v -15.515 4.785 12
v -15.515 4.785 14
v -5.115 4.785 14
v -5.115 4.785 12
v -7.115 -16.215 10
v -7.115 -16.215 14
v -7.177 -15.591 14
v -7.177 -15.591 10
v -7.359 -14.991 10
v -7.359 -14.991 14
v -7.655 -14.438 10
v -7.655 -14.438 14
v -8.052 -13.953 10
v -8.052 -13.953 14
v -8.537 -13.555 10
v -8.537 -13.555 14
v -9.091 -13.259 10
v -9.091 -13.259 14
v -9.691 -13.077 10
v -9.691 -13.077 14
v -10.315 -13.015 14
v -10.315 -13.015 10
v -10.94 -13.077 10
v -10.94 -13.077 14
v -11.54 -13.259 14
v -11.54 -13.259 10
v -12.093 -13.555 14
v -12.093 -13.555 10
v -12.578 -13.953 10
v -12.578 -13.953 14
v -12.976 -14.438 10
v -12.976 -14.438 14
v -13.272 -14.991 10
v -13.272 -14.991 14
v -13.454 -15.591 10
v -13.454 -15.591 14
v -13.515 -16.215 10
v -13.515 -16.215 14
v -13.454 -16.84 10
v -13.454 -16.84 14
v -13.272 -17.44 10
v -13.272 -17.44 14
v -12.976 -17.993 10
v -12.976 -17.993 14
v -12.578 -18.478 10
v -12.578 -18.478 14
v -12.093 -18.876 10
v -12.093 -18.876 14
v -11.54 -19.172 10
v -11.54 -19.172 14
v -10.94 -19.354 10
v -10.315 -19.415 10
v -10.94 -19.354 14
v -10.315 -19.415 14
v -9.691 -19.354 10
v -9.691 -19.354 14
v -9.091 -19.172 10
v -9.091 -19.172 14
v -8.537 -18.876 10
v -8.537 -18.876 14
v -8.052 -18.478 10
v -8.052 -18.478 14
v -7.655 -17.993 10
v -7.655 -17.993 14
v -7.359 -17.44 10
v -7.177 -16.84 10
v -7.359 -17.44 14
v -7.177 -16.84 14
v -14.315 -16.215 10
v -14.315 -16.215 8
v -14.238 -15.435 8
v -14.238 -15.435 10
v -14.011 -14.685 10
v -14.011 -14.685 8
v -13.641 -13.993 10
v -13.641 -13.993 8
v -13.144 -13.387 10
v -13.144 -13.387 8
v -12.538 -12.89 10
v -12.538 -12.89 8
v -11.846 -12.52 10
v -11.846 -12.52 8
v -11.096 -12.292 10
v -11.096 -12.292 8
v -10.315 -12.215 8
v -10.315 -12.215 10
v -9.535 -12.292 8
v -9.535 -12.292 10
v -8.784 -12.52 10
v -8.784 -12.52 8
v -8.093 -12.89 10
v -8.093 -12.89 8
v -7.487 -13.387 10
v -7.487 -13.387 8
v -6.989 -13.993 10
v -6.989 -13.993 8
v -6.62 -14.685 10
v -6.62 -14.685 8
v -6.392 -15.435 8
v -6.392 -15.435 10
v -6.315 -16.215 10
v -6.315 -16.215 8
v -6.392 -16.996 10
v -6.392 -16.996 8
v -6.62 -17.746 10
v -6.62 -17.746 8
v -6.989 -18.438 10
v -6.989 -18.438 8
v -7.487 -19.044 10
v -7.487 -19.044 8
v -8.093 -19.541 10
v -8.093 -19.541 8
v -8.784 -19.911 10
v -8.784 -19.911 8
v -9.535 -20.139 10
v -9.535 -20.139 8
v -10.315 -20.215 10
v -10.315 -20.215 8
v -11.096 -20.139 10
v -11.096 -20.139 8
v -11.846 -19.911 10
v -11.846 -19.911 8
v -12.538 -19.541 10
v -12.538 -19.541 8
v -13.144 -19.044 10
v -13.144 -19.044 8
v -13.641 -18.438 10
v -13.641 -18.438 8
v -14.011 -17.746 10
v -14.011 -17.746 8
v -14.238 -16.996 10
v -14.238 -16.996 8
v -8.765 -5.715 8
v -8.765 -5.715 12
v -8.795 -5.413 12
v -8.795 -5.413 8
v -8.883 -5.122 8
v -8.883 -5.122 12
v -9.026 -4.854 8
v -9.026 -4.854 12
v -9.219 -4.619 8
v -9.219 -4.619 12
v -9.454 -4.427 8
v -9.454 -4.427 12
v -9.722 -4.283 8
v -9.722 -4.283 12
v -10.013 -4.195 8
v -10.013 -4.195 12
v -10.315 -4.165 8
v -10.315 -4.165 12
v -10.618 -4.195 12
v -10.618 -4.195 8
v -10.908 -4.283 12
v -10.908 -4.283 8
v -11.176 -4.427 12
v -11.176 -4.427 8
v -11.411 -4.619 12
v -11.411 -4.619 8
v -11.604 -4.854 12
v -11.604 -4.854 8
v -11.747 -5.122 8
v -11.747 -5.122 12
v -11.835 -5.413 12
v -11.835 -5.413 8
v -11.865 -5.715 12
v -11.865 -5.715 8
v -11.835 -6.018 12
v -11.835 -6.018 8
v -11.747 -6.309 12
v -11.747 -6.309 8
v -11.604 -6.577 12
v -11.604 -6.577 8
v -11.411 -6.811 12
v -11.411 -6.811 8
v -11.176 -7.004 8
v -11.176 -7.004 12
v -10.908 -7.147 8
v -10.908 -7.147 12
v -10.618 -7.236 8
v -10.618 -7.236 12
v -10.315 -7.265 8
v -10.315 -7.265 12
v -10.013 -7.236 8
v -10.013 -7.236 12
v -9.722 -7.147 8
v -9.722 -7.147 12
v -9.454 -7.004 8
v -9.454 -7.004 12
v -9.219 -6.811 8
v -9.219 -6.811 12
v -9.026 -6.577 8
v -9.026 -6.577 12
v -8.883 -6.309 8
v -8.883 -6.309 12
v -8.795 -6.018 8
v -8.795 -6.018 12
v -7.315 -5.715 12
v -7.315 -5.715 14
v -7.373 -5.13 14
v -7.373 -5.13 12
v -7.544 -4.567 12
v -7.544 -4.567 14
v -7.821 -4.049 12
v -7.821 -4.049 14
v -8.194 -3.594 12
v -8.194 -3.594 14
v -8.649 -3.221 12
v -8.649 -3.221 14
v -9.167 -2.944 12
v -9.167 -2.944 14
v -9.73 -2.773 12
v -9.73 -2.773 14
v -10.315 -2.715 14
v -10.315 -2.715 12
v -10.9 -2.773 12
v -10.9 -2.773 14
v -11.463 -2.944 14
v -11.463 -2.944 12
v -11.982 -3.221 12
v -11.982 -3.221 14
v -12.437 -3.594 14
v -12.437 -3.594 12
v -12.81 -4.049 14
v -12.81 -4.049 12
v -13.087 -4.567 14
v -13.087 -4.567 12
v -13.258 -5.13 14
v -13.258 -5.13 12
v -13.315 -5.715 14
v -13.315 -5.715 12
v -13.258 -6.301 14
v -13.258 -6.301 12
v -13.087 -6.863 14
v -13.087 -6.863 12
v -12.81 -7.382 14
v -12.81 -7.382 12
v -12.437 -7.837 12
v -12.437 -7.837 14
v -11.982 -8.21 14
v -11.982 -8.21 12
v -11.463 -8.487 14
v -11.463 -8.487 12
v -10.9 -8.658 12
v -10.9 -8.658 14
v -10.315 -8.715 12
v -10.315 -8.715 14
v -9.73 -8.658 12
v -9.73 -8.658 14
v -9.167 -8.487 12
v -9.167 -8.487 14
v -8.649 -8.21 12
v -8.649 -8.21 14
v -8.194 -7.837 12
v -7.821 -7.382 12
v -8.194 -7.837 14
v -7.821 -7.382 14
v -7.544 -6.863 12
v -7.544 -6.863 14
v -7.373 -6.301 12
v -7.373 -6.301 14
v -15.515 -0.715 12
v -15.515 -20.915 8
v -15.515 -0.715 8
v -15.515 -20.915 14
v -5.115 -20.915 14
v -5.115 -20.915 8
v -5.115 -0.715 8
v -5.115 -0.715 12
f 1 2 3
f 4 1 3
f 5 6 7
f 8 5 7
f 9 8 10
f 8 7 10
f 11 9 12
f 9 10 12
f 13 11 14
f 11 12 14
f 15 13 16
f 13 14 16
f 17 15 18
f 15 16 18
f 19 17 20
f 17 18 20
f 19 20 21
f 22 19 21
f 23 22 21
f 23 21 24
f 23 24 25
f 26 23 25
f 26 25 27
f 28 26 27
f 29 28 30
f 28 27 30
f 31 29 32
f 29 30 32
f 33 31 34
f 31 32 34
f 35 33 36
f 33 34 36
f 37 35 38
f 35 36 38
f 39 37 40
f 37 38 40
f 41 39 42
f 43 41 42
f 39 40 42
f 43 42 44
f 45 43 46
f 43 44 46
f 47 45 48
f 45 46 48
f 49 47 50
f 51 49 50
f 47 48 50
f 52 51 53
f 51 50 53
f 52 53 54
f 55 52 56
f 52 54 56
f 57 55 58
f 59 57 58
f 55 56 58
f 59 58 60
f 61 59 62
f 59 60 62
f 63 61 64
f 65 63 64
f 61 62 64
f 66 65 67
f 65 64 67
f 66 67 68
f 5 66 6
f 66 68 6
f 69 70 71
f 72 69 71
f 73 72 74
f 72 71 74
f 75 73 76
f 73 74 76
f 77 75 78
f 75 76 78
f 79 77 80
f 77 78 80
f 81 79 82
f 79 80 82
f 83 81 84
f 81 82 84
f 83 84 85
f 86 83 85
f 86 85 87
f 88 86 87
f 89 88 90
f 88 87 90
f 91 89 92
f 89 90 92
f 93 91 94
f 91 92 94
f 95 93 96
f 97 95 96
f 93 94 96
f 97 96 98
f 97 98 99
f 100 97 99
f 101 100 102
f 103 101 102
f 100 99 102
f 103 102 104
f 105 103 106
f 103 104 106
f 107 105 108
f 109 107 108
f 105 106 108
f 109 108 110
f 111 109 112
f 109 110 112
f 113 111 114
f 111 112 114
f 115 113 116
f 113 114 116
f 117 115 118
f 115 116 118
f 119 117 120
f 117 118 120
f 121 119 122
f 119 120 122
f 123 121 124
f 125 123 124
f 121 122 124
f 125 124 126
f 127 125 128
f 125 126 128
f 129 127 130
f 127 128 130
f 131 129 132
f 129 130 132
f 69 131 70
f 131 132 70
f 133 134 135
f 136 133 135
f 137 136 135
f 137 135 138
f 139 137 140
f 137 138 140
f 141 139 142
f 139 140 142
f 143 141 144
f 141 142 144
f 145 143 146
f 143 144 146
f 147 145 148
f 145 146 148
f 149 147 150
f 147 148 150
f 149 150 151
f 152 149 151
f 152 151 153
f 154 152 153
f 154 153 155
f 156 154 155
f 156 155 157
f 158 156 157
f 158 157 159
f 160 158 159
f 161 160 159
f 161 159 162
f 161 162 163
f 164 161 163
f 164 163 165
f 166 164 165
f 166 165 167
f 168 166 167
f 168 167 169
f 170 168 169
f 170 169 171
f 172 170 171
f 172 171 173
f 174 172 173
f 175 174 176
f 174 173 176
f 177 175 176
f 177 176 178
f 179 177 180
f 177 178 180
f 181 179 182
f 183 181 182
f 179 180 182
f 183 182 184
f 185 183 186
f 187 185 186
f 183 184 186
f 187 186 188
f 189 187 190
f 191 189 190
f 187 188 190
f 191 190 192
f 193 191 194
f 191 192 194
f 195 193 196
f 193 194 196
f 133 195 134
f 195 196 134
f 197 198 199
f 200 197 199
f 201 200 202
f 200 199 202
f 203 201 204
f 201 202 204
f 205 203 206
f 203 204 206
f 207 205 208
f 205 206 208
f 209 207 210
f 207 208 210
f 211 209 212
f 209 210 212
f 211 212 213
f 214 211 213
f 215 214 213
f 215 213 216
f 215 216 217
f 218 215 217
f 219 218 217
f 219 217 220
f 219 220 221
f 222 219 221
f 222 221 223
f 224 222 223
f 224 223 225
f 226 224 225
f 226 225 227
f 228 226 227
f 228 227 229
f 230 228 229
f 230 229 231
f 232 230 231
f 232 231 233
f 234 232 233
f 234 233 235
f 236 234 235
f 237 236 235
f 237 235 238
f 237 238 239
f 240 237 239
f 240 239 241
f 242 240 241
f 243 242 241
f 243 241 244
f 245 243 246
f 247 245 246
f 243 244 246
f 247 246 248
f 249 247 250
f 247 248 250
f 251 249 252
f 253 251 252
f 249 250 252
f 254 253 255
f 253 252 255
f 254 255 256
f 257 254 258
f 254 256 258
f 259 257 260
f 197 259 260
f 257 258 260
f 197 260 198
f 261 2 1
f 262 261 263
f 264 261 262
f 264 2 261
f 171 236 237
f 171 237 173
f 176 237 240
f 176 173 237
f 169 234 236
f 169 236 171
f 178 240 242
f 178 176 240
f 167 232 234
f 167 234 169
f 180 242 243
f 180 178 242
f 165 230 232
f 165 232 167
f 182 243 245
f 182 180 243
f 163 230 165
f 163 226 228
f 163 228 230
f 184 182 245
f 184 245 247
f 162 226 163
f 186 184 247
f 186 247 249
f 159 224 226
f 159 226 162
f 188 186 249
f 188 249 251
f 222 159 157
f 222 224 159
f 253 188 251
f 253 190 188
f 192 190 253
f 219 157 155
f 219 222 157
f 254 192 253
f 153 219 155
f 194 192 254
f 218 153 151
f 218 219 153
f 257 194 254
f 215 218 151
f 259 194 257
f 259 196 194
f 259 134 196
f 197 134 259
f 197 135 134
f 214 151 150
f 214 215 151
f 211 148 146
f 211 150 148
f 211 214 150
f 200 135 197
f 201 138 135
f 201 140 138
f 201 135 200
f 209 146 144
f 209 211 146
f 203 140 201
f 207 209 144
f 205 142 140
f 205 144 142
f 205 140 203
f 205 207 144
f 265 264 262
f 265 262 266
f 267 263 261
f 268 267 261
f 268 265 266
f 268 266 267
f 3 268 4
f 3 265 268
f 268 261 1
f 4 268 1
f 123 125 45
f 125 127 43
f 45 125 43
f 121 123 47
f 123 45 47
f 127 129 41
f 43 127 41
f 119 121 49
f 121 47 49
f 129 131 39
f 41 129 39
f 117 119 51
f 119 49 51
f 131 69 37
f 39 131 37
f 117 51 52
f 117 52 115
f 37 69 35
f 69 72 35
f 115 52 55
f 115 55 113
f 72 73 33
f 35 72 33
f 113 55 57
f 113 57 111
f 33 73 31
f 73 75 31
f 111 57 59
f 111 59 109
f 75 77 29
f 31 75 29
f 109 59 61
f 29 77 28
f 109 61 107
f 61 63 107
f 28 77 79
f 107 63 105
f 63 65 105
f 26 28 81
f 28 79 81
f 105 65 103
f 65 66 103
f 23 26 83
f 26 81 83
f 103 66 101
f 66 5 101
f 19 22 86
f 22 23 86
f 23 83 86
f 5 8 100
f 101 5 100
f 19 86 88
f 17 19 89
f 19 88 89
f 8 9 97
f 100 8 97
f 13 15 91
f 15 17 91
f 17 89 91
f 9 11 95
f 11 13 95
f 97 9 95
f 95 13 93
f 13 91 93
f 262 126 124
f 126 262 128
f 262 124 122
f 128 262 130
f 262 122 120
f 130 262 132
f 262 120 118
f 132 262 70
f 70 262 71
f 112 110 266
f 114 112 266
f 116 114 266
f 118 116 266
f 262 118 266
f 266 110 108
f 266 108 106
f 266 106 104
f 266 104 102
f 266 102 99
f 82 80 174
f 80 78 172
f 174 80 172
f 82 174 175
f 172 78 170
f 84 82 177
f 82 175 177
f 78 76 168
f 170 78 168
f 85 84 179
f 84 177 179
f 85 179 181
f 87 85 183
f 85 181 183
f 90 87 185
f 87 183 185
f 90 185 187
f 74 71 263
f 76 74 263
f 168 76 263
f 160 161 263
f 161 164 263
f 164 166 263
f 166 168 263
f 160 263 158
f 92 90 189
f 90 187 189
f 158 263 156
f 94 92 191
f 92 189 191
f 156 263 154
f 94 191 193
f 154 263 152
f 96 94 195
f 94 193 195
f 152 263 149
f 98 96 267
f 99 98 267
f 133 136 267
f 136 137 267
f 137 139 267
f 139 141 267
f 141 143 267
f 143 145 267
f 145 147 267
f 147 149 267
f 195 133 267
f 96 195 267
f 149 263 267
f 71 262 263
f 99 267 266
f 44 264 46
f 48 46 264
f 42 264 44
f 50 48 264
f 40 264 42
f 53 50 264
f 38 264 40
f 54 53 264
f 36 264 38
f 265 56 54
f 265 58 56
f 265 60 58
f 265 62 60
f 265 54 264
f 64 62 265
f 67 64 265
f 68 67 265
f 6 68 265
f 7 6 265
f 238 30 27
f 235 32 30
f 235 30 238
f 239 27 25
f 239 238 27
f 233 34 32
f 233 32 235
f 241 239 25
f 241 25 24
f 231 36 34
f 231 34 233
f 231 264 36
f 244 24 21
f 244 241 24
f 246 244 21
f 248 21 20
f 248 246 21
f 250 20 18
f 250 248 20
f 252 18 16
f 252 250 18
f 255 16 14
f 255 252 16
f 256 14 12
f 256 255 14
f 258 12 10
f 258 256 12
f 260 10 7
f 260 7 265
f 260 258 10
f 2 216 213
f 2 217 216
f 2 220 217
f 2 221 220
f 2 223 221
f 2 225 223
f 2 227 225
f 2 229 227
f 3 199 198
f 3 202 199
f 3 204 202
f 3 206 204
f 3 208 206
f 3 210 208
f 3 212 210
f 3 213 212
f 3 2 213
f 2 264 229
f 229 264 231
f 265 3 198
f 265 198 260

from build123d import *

# Parameters (mm, degrees)
SKETCH_1_W          = 10
SKETCH_1_H          = 25.5
EXTRUDE_1_DEPTH     = 15
SKETCH_2_R          = 1.55
CUT_EXTRUDE_1_DEPTH = 15
SKETCH_3_R          = 3
CUT_EXTRUDE_2_DEPTH = 3
SKETCH_4_R          = 3.5
CUT_EXTRUDE_3_DEPTH = 15
SKETCH_5_W          = 8
SKETCH_5_H          = 25.5
CUT_EXTRUDE_4_DEPTH = 15
SKETCH_6_R          = 4
CUT_EXTRUDE_5_DEPTH = 2
SKETCH_7_W          = 4
SKETCH_7_H          = 5.5
CUT_EXTRUDE_6_DEPTH = 15
SKETCH_8_W          = 0.2
SKETCH_8_H          = 25.5
SKETCH_8_W_2        = 10.4
SKETCH_8_H_2        = 0.2
EXTRUDE_2_DEPTH     = 7
SKETCH_9_W          = 4
SKETCH_9_H          = 5.5
CUT_EXTRUDE_7_DEPTH = 20
SKETCH_10_W         = 1
SKETCH_10_H         = 25.7
CUT_EXTRUDE_9_DEPTH = 15
SKETCH_12_R         = 3.5
SKETCH_12_R_2       = 3.2
EXTRUDE_4_DEPTH     = 4


with BuildPart() as part:
    # 草图1 → 凸台-拉伸1 (new body)
    with BuildSketch(Plane.XY):
        with Locations((-10.315219411, -7.965383481)):
            Rectangle(SKETCH_1_W, SKETCH_1_H)
    extrude(amount=EXTRUDE_1_DEPTH)

    # 草图2 → 切除-拉伸1 (cut)
    with BuildSketch(Plane.XY.offset(15)):
        with Locations((-10.315219411, -5.715383481)):
            Circle(SKETCH_2_R)
    extrude(amount=-CUT_EXTRUDE_1_DEPTH, mode=Mode.SUBTRACT)

    # 草图3 → 切除-拉伸2 (cut)
    with BuildSketch(Plane.XY.offset(15)):
        with Locations((-10.315219411, -5.715383481)):
            Circle(SKETCH_3_R)
    extrude(amount=-CUT_EXTRUDE_2_DEPTH, mode=Mode.SUBTRACT)

    # 草图4 → 切除-拉伸3 (cut)
    with BuildSketch(Plane.XY.offset(15)):
        with Locations((-10.315219411, -16.215383481)):
            Circle(SKETCH_4_R)
    extrude(amount=-CUT_EXTRUDE_3_DEPTH, mode=Mode.SUBTRACT)

    # 草图5 → 切除-拉伸4 (cut)
    with BuildSketch(Plane(origin=(-5.315219411, 0, 0), x_dir=(0, 0, -1), z_dir=(1, 0, 0))):
        with Locations((-4, -7.965383481)):
            Rectangle(SKETCH_5_W, SKETCH_5_H)
    extrude(amount=-CUT_EXTRUDE_4_DEPTH, mode=Mode.SUBTRACT)

    # 草图6 → 切除-拉伸5 (cut)
    with BuildSketch(Plane(origin=(0, 0, 8), x_dir=(-1, 0, 0), z_dir=(0, 0, -1))):
        with Locations((10.315219411, -16.215383481)):
            Circle(SKETCH_6_R)
    extrude(amount=-CUT_EXTRUDE_5_DEPTH, mode=Mode.SUBTRACT)

    # 草图7 → 切除-拉伸6 (cut)
    with BuildSketch(Plane(origin=(-5.315219411, 0, 0), x_dir=(0, 0, -1), z_dir=(1, 0, 0))):
        with Locations((-10, 2.034616519)):
            Rectangle(SKETCH_7_W, SKETCH_7_H)
    extrude(amount=-CUT_EXTRUDE_6_DEPTH, mode=Mode.SUBTRACT)

    # 草图8 → 凸台-拉伸2 (add)
    with BuildSketch(Plane.XY.offset(15)):
        with Locations((-15.415219411, -7.965383481)):
            Rectangle(SKETCH_8_W, SKETCH_8_H)
        with Locations((-5.215219411, -7.965383481)):
            Rectangle(SKETCH_8_W, SKETCH_8_H)
        with Locations((-10.315219411, -20.815383481)):
            Rectangle(SKETCH_8_W_2, SKETCH_8_H_2)
    extrude(amount=-EXTRUDE_2_DEPTH)

    # 草图9 → 切除-拉伸7 (cut)
    with BuildSketch(Plane.ZY.offset(15.515219411)):
        with Locations((10, 2.034616519)):
            Rectangle(SKETCH_9_W, SKETCH_9_H)
    extrude(amount=-CUT_EXTRUDE_7_DEPTH, mode=Mode.SUBTRACT)

    # 草图10 → 切除-拉伸9 (cut)
    with BuildSketch(Plane.ZY.offset(15.515219411)):
        with Locations((14.5, -8.065383481)):
            Rectangle(SKETCH_10_W, SKETCH_10_H)
    extrude(amount=-CUT_EXTRUDE_9_DEPTH, mode=Mode.SUBTRACT)

    # 草图12 → 凸台-拉伸4 (add)
    with BuildSketch(Plane.XY.offset(14)):
        with Locations((-10.315219411, -16.215383481)):
            Circle(SKETCH_12_R)
        with Locations((-10.315219411, -16.215383481)):
            Circle(SKETCH_12_R_2, mode=Mode.SUBTRACT)
    extrude(amount=-EXTRUDE_4_DEPTH)


solid = part.part
